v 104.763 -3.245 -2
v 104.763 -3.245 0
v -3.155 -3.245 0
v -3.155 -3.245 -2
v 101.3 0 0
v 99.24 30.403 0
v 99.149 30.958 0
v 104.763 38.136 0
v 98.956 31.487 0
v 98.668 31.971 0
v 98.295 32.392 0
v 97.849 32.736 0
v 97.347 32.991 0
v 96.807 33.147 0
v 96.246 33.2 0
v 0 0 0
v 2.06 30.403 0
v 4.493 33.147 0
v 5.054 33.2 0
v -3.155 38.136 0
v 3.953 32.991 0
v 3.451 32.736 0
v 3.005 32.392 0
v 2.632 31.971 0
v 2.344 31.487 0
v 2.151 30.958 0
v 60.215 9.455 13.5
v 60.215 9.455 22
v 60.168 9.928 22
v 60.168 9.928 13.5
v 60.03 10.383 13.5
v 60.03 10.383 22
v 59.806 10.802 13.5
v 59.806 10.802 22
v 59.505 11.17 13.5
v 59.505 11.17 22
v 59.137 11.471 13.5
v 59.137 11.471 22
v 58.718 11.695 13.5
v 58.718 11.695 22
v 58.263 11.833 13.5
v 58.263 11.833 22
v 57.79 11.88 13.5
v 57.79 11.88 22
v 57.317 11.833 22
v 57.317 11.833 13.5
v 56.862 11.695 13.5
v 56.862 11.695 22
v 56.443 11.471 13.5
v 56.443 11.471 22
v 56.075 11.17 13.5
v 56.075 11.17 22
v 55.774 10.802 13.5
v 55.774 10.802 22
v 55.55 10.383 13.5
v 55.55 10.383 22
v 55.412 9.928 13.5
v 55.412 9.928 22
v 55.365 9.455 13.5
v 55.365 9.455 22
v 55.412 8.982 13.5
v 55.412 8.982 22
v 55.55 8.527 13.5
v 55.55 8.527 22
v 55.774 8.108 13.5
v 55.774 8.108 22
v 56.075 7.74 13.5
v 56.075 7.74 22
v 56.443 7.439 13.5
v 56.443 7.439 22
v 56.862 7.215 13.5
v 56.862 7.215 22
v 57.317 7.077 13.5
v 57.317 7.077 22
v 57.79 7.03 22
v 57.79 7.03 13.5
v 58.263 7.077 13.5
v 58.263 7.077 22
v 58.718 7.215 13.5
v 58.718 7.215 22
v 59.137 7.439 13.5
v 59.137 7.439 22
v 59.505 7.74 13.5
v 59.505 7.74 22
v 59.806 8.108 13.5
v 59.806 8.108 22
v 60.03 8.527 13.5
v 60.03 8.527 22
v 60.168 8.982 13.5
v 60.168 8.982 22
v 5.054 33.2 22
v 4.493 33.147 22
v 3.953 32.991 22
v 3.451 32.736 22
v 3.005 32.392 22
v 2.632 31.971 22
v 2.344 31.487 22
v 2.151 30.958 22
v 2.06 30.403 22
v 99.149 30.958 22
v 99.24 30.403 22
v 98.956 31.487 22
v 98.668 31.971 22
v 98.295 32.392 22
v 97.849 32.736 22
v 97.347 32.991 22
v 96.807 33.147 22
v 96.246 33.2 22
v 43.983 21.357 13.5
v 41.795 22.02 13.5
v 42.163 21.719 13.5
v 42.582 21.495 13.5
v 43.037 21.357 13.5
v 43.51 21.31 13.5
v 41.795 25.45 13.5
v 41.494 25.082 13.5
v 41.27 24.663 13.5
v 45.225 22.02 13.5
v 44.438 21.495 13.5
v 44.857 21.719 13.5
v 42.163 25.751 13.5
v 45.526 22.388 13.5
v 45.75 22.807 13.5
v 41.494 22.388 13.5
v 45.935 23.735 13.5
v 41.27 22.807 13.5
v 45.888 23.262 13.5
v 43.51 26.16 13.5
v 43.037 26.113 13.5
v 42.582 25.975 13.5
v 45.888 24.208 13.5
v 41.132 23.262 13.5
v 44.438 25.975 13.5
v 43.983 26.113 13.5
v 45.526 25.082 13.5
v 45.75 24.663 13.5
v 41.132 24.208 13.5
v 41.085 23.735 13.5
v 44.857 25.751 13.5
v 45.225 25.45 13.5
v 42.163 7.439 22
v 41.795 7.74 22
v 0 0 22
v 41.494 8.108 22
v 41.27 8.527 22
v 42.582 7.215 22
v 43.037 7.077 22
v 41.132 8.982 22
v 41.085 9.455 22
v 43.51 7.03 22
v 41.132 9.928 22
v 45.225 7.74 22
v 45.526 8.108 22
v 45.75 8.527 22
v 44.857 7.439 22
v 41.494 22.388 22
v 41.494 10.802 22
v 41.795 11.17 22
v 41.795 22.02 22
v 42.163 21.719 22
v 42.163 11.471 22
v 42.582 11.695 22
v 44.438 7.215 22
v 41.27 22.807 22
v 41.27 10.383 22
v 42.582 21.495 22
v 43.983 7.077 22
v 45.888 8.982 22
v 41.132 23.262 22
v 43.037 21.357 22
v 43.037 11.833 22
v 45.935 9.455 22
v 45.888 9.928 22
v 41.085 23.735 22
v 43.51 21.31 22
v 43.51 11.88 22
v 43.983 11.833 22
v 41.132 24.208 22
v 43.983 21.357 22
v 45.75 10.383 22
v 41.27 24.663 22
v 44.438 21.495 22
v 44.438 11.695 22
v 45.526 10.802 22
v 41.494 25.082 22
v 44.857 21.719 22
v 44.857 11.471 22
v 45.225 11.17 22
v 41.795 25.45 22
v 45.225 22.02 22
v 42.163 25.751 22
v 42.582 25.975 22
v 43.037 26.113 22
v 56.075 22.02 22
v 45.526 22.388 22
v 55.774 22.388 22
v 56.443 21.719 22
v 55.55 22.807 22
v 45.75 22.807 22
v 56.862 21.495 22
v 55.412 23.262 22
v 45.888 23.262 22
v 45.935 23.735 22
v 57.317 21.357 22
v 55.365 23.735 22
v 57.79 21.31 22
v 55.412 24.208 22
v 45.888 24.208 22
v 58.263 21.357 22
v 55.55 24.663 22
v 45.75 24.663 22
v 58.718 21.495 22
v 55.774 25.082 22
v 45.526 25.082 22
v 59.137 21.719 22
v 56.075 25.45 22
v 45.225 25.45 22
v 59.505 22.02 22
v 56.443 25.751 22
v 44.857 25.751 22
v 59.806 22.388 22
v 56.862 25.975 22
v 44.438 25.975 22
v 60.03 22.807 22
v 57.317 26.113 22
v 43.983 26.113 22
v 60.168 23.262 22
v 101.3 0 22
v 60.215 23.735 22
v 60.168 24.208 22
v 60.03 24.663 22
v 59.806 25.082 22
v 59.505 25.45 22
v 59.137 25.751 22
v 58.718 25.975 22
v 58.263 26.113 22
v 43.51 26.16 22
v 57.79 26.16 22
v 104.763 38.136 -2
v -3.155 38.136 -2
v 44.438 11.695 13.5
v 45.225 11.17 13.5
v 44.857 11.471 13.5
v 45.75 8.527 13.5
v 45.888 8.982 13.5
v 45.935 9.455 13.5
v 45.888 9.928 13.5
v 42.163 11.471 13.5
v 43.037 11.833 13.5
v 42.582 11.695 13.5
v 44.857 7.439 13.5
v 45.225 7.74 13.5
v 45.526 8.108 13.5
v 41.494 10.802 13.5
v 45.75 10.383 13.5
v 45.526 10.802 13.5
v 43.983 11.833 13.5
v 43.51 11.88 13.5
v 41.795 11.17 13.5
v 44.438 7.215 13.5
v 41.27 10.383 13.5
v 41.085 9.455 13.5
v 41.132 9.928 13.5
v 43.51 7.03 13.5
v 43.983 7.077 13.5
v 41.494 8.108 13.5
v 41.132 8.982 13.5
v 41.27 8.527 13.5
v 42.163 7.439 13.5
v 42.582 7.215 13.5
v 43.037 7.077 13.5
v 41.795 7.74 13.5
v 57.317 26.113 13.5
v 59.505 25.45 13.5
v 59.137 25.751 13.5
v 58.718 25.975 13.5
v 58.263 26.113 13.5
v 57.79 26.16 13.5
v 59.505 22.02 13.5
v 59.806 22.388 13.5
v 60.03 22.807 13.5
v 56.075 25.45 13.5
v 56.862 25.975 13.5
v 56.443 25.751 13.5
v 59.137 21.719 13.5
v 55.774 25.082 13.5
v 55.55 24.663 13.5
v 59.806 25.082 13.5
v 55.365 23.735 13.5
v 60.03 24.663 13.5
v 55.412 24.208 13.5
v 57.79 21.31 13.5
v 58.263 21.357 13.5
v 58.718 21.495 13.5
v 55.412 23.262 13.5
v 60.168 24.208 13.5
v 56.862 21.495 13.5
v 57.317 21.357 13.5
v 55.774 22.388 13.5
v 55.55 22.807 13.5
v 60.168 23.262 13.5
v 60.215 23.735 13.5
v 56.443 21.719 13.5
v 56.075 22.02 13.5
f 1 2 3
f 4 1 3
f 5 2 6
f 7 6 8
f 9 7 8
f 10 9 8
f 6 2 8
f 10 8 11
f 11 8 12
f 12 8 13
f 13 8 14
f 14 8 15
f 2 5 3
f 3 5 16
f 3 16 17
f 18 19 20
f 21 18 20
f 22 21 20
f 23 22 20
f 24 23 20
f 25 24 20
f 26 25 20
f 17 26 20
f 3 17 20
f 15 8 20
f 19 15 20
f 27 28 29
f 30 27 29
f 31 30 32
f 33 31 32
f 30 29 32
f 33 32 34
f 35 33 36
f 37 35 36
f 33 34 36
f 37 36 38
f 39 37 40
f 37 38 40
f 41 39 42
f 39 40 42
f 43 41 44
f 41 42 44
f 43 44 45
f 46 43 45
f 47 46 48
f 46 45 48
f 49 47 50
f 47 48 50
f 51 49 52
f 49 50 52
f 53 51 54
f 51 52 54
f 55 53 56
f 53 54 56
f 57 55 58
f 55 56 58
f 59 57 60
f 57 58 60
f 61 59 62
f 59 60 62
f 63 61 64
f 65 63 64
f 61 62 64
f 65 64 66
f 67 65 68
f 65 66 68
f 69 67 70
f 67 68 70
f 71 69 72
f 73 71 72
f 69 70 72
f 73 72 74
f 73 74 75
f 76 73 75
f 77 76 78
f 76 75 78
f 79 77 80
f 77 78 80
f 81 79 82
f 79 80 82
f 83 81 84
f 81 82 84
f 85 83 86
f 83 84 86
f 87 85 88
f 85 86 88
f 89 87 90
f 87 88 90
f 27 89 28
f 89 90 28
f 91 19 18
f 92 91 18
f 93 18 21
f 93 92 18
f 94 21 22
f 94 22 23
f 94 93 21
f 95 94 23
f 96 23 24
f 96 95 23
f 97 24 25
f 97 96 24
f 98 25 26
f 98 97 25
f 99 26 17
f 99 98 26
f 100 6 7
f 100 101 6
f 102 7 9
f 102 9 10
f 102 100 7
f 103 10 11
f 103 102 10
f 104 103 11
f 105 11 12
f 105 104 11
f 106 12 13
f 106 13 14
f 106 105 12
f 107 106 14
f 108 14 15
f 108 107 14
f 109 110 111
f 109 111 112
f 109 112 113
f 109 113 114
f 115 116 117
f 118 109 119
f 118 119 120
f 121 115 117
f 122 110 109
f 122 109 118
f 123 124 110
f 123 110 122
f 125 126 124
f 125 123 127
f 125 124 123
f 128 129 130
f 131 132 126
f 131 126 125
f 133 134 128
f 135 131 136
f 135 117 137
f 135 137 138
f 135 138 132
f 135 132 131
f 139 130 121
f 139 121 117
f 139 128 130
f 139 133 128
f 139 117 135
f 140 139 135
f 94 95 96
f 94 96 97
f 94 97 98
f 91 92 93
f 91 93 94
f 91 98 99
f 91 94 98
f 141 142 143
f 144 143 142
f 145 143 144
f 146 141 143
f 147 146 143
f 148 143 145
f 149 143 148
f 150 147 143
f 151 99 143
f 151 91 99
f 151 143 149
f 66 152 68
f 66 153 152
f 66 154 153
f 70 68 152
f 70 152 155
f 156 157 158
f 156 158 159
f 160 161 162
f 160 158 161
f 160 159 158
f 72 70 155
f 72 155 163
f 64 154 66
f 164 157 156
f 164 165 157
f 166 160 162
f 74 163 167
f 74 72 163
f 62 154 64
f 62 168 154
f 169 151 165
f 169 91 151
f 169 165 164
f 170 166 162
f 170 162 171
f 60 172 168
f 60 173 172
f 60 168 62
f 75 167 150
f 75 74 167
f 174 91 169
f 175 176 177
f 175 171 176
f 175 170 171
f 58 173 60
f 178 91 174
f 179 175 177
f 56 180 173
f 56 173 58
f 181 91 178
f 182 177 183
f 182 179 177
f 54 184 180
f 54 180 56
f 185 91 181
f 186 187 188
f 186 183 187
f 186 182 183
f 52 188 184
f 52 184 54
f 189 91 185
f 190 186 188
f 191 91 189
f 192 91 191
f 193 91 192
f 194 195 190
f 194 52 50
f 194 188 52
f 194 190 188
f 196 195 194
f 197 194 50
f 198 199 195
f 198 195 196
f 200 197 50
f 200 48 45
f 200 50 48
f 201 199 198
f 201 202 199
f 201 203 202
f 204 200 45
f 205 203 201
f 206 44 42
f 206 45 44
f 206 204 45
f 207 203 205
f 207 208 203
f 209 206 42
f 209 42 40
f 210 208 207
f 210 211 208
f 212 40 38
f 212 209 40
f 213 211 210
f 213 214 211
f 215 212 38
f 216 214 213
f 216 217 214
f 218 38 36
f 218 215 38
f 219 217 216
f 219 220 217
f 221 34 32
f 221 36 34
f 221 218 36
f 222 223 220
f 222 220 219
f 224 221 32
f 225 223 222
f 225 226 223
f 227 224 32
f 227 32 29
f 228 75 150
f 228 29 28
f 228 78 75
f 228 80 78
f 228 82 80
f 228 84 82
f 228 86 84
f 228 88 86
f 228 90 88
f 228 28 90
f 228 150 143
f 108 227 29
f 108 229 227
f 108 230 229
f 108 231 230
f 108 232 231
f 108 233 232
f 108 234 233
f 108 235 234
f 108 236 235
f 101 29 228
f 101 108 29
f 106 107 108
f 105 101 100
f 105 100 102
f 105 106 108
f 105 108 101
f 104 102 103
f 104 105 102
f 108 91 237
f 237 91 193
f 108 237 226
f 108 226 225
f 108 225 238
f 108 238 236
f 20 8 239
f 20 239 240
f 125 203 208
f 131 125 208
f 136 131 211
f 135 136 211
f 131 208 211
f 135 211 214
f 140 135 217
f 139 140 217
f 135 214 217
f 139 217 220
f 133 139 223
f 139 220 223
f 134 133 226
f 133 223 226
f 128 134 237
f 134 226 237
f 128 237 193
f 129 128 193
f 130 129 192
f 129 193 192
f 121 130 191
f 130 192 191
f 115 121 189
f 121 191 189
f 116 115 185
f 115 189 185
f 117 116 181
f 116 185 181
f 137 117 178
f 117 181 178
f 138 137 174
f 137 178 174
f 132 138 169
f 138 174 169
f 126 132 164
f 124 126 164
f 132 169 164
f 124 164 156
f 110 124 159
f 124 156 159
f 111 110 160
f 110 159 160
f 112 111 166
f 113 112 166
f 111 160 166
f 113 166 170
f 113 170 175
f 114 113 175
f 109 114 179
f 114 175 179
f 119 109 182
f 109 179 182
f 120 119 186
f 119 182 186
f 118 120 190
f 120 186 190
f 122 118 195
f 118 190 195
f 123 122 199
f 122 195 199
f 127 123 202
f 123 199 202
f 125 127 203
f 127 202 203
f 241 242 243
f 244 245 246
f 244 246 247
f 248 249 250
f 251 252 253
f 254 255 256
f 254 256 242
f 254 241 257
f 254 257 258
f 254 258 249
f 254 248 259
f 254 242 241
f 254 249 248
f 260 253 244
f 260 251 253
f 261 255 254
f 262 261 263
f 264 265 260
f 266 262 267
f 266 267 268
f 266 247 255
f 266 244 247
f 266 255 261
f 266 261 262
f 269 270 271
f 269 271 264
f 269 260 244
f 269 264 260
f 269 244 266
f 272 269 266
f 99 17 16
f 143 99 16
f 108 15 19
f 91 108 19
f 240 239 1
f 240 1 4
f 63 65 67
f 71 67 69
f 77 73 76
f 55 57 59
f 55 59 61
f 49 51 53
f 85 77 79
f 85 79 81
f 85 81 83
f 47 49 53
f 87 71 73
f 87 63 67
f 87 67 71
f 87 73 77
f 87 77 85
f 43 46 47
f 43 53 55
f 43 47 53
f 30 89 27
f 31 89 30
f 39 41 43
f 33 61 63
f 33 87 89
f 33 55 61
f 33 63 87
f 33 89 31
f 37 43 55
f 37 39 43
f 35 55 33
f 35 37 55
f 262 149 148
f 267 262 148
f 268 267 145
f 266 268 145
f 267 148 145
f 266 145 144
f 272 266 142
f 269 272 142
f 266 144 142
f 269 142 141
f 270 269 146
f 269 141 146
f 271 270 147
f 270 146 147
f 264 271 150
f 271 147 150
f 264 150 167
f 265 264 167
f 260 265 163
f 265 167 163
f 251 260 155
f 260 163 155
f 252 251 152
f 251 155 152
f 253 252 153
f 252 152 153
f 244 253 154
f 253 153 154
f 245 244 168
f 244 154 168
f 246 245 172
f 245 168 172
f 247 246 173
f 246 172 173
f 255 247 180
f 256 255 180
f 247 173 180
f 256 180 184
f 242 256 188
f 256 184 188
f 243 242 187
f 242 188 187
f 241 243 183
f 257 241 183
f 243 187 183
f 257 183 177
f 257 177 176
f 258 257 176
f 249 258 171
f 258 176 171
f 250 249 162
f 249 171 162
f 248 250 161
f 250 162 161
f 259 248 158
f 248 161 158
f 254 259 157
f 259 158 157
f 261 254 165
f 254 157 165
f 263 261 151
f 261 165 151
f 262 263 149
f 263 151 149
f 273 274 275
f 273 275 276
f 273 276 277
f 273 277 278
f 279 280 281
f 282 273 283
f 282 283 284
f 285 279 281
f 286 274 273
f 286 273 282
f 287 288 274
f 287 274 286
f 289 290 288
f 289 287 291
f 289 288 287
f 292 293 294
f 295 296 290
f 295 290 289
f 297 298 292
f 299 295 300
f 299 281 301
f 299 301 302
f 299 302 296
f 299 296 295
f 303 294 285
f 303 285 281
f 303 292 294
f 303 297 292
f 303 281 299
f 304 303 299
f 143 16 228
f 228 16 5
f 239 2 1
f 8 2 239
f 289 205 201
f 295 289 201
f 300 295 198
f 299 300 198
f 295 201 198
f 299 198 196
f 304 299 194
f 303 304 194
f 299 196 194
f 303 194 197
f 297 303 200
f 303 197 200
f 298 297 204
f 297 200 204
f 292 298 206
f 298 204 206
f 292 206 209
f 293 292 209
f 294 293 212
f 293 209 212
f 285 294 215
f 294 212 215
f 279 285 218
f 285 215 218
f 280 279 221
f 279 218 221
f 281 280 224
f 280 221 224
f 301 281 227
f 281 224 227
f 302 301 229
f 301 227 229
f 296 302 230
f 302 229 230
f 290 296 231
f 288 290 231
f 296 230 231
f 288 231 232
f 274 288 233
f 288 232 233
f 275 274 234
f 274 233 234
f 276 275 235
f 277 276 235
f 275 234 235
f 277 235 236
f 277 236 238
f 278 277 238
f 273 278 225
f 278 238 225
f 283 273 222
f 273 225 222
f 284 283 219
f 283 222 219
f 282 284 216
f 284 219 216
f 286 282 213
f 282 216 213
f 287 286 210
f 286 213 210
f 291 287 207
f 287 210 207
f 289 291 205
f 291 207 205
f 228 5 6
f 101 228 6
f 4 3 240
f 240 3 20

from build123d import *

# Parameters (mm, degrees)
P_IDAT_VYSUNUT_M1_DEPTH  = 22
ZAOBLIT1_R               = 3
SKICA2_W                 = 107.918638888
SKICA2_H                 = 41.380791124
P_IDAT_VYSUNUT_M2_DEPTH  = 2
SKICA3_R                 = 2.425
ODEBRAT_VYSUNUT_M1_DEPTH = 8.5


with BuildPart() as part:
    # Skica1 → Přidat vysunutím1 (new body)
    with BuildSketch(Plane.XY):
        Polygon((0, 0), (101.3, 0), (99.05, 33.2), (2.25, 33.2), align=None)
    extrude(amount=P_IDAT_VYSUNUT_M1_DEPTH)

    # Zaoblit1
    zaoblit1_edges = [part.edges().sort_by_distance(p)[0] for p in [
        (2.25, 33.2, 11),
        (99.05, 33.2, 11),
    ]]
    fillet(zaoblit1_edges, radius=ZAOBLIT1_R)

    # Skica2 → Přidat vysunutím2 (add)
    with BuildSketch(Plane(origin=(0, 0, 0), x_dir=(-1, 0, 0), z_dir=(0, 0, -1))):
        with Locations((-50.804022796, 17.445366235)):
            Rectangle(SKICA2_W, SKICA2_H)
    extrude(amount=P_IDAT_VYSUNUT_M2_DEPTH)

    # Skica3 → Odebrat vysunutím1 (cut)
    with BuildSketch(Plane.XY.offset(22)):
        with Locations((57.79, 9.455)):
            Circle(SKICA3_R)
        with Locations(Location((43.51, 9.455, 0), (0, 0, 180))):
            Circle(SKICA3_R)
        with Locations(Location((57.79, 23.735, 0), (0, 0, 180))):
            Circle(SKICA3_R)
        with Locations((43.51, 23.735)):
            Circle(SKICA3_R)
    extrude(amount=-ODEBRAT_VYSUNUT_M1_DEPTH, mode=Mode.SUBTRACT)


solid = part.part
